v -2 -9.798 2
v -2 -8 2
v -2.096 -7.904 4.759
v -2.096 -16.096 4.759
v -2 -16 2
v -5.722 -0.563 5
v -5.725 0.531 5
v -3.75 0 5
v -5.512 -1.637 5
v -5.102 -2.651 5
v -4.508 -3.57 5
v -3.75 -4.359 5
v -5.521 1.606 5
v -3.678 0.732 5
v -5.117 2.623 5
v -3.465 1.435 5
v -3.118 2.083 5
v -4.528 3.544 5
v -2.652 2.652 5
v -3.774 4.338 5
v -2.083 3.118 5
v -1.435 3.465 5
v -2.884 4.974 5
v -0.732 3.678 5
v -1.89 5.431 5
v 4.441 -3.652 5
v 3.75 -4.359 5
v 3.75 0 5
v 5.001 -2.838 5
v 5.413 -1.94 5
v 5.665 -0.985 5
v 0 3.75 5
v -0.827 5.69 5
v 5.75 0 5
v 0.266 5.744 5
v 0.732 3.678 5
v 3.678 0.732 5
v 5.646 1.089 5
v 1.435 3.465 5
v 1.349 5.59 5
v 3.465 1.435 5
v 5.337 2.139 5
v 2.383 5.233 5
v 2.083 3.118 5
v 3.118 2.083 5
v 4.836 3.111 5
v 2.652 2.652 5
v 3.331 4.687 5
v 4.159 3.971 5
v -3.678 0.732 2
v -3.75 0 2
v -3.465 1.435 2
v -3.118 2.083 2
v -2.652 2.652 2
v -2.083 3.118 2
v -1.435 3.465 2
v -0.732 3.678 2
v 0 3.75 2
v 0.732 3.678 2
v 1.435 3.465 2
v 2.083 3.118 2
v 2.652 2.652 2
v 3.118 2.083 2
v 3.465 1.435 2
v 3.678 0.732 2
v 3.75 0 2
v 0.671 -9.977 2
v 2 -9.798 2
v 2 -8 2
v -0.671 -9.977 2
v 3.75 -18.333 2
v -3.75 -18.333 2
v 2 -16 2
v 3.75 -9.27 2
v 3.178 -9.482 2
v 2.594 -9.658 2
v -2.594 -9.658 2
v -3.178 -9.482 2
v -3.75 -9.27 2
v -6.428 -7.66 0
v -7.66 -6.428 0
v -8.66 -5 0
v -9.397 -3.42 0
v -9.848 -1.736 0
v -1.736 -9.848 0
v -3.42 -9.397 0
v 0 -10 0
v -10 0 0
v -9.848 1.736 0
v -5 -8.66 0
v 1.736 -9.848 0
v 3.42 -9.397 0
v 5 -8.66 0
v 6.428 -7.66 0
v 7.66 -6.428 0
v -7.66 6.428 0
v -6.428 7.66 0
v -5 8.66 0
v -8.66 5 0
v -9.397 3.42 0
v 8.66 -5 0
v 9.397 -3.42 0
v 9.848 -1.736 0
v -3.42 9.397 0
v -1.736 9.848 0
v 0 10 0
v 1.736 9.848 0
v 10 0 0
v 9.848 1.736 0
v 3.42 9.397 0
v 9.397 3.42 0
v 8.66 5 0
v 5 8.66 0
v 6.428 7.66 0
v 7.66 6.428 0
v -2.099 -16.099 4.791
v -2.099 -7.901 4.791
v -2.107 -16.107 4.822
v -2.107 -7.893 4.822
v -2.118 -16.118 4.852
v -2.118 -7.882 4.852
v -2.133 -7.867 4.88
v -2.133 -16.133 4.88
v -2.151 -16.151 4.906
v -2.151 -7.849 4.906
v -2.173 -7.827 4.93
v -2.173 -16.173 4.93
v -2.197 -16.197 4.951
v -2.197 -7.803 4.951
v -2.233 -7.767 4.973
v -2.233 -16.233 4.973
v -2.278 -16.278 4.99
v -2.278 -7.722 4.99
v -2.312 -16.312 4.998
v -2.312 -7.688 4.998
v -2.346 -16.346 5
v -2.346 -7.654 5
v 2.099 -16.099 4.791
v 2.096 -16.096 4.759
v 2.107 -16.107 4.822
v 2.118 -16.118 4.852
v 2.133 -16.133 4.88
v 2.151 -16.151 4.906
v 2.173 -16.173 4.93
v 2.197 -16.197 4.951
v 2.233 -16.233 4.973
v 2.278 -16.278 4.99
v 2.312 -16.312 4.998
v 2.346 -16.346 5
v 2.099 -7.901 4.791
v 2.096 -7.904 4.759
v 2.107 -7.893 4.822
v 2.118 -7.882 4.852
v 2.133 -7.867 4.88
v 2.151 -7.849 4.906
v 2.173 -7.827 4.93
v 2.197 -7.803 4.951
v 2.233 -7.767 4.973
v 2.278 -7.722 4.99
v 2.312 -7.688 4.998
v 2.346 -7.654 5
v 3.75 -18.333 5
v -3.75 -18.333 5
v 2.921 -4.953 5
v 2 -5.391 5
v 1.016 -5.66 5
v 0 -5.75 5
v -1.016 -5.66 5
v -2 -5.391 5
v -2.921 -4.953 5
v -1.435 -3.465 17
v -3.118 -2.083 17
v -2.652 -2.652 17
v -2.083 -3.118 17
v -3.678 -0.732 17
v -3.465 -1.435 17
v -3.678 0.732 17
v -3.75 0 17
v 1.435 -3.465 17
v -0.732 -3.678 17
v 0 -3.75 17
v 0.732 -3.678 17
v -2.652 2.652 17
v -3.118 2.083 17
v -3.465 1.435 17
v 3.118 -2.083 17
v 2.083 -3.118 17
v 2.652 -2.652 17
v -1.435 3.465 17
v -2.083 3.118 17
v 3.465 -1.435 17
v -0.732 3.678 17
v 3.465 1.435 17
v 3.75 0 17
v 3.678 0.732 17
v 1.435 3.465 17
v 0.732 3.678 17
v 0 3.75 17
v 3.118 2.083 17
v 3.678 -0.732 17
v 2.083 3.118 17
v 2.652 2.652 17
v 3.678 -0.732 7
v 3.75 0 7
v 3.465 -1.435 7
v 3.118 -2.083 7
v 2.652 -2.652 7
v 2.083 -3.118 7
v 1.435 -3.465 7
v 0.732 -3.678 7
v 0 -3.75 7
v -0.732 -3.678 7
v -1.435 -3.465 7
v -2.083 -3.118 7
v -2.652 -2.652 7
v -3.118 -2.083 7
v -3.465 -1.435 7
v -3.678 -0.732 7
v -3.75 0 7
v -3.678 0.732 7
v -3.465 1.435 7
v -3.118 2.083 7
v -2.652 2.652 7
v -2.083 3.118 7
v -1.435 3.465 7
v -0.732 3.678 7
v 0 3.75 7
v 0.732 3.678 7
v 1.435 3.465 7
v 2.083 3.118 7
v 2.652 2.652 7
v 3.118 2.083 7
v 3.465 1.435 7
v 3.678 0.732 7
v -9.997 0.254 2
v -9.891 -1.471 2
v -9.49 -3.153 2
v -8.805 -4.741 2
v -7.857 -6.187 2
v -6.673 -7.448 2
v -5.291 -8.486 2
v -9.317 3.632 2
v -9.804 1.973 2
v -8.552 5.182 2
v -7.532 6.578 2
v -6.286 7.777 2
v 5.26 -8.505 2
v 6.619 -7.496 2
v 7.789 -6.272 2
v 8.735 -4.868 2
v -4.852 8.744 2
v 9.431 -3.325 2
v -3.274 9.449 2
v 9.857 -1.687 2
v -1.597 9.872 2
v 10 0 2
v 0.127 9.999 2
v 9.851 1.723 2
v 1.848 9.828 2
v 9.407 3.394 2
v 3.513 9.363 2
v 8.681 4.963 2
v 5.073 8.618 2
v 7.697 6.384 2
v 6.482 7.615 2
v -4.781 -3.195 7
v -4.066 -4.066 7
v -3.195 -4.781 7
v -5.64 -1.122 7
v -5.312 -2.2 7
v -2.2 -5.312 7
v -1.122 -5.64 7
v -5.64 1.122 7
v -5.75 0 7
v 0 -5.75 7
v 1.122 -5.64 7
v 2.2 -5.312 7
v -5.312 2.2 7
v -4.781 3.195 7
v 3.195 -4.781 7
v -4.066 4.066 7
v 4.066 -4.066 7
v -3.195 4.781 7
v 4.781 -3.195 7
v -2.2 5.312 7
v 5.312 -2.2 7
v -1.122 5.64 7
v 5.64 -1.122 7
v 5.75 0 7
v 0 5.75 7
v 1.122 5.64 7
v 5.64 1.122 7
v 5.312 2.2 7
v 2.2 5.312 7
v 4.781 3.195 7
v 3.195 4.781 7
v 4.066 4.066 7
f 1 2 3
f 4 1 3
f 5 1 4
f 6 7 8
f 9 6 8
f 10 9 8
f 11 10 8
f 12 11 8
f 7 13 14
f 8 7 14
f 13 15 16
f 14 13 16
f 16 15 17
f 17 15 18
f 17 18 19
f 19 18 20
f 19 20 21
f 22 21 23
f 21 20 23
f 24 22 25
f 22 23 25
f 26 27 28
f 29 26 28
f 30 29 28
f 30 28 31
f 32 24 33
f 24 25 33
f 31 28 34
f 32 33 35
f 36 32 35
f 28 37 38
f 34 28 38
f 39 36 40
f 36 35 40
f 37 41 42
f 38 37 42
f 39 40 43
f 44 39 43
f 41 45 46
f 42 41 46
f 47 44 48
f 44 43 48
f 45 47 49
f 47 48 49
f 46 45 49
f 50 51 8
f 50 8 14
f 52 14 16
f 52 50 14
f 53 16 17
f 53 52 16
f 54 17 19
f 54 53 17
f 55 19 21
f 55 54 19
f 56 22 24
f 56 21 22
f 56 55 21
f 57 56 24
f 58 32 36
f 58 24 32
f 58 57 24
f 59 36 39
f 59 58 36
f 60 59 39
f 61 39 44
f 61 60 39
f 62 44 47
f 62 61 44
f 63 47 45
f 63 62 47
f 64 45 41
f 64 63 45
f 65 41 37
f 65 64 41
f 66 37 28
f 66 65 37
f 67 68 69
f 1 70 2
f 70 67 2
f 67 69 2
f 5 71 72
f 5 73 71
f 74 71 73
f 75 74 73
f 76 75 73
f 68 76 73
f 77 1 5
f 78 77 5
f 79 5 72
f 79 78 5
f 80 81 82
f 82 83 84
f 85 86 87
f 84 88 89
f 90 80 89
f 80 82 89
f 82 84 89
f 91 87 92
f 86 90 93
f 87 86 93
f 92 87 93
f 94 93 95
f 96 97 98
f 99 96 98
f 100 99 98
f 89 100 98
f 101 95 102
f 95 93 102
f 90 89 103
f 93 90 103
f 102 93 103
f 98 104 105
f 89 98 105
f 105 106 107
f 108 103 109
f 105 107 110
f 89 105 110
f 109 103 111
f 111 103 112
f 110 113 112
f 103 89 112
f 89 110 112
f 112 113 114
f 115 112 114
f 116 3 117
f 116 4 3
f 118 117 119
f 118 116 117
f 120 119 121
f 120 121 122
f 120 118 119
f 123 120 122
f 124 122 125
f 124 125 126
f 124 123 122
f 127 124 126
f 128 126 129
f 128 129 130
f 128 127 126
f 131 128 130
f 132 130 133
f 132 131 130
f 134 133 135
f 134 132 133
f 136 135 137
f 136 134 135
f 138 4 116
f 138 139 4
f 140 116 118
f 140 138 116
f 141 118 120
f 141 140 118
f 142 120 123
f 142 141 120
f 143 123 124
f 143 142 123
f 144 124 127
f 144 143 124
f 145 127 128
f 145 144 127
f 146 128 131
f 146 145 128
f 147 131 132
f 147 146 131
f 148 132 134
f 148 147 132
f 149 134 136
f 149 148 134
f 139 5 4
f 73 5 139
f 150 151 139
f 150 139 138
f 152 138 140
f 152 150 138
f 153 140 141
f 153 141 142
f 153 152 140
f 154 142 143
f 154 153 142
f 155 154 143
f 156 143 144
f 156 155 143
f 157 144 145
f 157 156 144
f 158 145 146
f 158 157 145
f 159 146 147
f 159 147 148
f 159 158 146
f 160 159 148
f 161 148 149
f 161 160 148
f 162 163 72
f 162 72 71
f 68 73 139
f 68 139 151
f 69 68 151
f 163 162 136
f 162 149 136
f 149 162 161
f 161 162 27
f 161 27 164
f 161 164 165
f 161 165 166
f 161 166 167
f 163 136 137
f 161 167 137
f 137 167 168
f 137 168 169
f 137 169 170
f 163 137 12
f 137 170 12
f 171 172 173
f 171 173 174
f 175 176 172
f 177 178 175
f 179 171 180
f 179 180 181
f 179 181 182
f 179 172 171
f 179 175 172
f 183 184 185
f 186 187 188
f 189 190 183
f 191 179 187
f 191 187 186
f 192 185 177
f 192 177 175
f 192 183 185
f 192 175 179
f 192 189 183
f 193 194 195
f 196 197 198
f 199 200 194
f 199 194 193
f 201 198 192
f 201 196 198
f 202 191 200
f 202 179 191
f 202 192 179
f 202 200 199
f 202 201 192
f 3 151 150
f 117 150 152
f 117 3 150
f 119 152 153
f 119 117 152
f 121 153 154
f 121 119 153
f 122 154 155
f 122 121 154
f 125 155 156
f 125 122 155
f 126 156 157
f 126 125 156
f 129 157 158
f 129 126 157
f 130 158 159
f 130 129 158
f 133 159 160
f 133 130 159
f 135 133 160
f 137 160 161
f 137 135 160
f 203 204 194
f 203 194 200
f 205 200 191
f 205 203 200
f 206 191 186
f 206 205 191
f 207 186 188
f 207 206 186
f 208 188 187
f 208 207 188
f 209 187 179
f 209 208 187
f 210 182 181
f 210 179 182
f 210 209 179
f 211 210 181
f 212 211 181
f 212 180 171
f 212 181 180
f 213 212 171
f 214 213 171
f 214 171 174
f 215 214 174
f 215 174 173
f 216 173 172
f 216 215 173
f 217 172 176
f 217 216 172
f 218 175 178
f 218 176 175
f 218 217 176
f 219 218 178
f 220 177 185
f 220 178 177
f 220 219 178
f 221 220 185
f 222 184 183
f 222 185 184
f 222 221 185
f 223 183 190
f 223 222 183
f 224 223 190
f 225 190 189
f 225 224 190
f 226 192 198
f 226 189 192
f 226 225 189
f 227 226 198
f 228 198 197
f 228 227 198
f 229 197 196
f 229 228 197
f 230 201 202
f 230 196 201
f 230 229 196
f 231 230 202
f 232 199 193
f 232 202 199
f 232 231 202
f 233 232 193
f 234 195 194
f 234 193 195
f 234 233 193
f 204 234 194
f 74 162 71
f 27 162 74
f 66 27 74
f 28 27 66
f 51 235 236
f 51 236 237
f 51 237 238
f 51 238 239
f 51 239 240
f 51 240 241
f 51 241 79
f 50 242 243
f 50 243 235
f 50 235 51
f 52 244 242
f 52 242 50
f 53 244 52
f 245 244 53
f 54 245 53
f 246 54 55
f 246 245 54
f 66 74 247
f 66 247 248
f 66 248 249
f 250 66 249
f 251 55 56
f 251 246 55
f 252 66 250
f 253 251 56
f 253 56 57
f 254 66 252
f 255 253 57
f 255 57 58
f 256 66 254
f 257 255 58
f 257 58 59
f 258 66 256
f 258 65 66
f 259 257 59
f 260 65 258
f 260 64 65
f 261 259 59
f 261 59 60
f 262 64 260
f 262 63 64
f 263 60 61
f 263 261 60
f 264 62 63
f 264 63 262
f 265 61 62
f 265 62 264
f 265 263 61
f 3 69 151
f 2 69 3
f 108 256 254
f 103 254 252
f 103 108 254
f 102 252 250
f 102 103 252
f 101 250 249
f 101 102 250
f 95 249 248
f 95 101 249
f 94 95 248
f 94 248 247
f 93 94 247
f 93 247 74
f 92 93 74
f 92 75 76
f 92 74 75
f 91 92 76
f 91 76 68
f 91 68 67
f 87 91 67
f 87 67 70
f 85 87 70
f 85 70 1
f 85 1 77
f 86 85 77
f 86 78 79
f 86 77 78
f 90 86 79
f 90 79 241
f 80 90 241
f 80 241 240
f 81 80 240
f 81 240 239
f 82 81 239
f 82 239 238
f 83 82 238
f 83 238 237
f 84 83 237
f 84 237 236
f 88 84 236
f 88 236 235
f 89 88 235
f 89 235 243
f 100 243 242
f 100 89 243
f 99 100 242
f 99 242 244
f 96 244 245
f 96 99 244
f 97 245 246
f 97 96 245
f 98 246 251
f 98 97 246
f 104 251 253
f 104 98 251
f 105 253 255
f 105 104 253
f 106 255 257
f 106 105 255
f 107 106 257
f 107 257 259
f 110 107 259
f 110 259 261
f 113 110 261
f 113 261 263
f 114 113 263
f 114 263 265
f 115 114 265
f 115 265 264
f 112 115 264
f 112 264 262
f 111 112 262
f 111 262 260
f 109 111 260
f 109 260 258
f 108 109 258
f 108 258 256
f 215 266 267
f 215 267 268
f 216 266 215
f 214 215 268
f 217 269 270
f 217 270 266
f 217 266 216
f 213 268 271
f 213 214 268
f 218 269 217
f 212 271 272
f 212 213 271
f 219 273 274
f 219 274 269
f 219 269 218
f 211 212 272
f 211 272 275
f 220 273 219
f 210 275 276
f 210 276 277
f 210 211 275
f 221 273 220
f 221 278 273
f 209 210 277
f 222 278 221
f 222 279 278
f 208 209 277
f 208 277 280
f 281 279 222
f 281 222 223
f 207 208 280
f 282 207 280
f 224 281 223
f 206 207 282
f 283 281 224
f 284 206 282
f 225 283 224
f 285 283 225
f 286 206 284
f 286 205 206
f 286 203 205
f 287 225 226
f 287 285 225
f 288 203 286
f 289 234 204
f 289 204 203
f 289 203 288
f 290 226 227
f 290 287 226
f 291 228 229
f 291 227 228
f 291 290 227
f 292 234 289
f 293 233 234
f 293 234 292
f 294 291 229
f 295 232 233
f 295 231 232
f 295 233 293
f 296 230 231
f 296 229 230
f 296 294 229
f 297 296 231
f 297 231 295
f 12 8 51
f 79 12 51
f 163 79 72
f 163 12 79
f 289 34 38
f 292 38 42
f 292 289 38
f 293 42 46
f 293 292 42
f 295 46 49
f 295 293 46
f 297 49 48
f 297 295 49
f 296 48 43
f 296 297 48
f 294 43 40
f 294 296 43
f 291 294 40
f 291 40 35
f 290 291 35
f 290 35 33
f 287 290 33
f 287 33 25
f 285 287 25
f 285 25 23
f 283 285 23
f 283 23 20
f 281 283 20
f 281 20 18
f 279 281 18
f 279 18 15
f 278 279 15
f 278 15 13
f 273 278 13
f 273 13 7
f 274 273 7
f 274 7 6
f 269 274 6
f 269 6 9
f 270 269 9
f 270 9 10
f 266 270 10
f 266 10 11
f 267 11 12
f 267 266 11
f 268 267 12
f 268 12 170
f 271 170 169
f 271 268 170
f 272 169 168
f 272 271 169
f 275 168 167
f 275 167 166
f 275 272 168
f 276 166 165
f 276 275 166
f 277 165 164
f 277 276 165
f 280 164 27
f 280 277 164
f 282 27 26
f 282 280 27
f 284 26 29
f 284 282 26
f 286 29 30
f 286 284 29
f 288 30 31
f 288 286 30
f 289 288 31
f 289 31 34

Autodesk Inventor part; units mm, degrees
ref_plane "YZ Plane" through (0, 0, 0) normal (1, 0, 0) x (0, 1, 0)
ref_plane "XZ Plane" through (0, 0, 0) normal (0, 1, 0) x (-1, 0, 0)
sketch "Sketch1" plane through (0, 0, 0) normal (0, 0, 1) x (1, 0, 0)
  circle A0 centre (0, 0) radius 10
  dimension "d0" = 20
extrude "Extrusion1" add sketch "Sketch1" along normal blind 2
sketch "Sketch2" plane through (0, 0, 2) normal (0, 0, 1) x (1, 0, 0)
  circle A0 centre (0, 0) radius 3.75
  dimension "d3" = 7.5
extrude "Extrusion2" add sketch "Sketch2" along normal blind 15
ref_plane "Work Plane2" through (0, 0, 7) normal (0, 0, 1) x (1, 0, 0)
sketch "Sketch7" plane through (0, 0, 7) normal (0, 0, 1) x (1, 0, 0)
  circle A0 centre (0, 0) radius 3.75 projected
  circle A1 centre (0, 0) radius 5.75
  dimension "d27" = 2
extrude "Extrusion7" add sketch "Sketch7" against normal blind 2
sketch "Sketch8" plane through (0, 0, 5) normal (0, 0, -1) x (-1, 0, 0)
  circle A0 centre (0, 0) radius 5.75 projected
  circle A1 centre (0, 0) radius 3.75 projected
  circle A2 centre (0, 0) radius 5.75 construction
  line L0 (5.75, 0) -> (-5.75, 0) construction
  line L1 (-3.75, 0) -> (3.75, 0)
  line L2 (3.75, 0) -> (3.75, -18.3333)
  line L3 (3.75, -18.3333) -> (-3.75, -18.3333)
  line L4 (-3.75, -18.3333) -> (-3.75, 0)
  dimension "d31" = 18.3333
extrude "Extrusion8" add sketch "Sketch8" along normal blind 3 contours L4 A1 L2 A0 | A0 L2 L3 L4 picked at (2.8343, -4.1874)
sketch "Sketch9" plane through (0, 0, 2) normal (0, 0, -1) x (-1, 0, 0)
  arc A0 (-3.75, -4.3589) -> (3.75, -4.3589) centre (0, 0) ccw projected
  line L0 (3.75, -18.3333) -> (3.75, -4.3589) projected
  line L1 (-3.75, -18.3333) -> (3.75, -18.3333) projected
  line L2 (-3.75, -4.3589) -> (-3.75, -18.3333) projected
  line L3 (-2, -8) -> (2, -8)
  line L4 (2, -8) -> (2, -16)
  line L5 (2, -16) -> (-2, -16)
  line L6 (-2, -16) -> (-2, -8)
  dimension "d34" = 2
  dimension "d35" = 4
  dimension "d36" = 8
  dimension "d37" = 8
extrude "Extrusion9" cut sketch "Sketch9" against normal up to surface (3 mm away) draft 2 contours L3 L4 L5 L6
fillet "Fillet2" radius 0.25 4 edges at (0, -16.1048, 5) (2.1048, -12, 5) (-2.1048, -12, 5) (0, -7.8952, 5)
equation "\"d1\" = IG_gearThickness"
equation "\"d3\" = IG_shaftDiameter"
equation "\"d4\" = IG_shaftLength"
equation "\"Wheel_Related_W_\" = 0"
equation "\"W_innerDepth\" = 4"
equation "\"W_wallThickness\" = 2"
equation "\"W_holesClearance\" = 0.3"
equation "\"W_outerGearHoleDiameter\" = 5.3"
equation "\"W_innerGearHoleDiameter\" = 10.1"
equation "\"TempSpotReserved7\" = 0"
equation "\"TempSpotReserved8\" = 0"
equation "\"TempSpotReserved9\" = 0"
equation "\"TempSpotReserved10\" = 0"
equation "\"TempSpotReserved11\" = 0"
equation "\"TempSpotReserved12\" = 0"
equation "\"TempSpotReserved13\" = 0"
equation "\"TempSpotReserved14\" = 0"
equation "\"TempSpotReserved15\" = 0"
equation "\"TempSpotReserved16\" = 0"
equation "\"TempSpotReserved17\" = 0"
equation "\"TempSpotReserved18\" = 0"
equation "\"TempSpotReserved19\" = 0"
equation "\"TempSpotReserved20\" = 0"
equation "\"Inner_Gear_Related_IG_\" = 0"
equation "\"IG_shaftDiameter\" = 7.5"
equation "\"IG_shaftLength\" = 15"
equation "\"IG_gearThickness\" = 2"
equation "\"TempSpotReserved25\" = 0"
equation "\"TempSpotReserved26\" = 0"
equation "\"TempSpotReserved27\" = 0"
equation "\"TempSpotReserved28\" = 0"
equation "\"TempSpotReserved29\" = 0"
equation "\"TempSpotReserved30\" = 0"
equation "\"TempSpotReserved31\" = 0"
equation "\"TempSpotReserved32\" = 0"
equation "\"TempSpotReserved33\" = 0"
equation "\"TempSpotReserved34\" = 0"
equation "\"TempSpotReserved35\" = 0"
equation "\"TempSpotReserved36\" = 0"
equation "\"TempSpotReserved37\" = 0"
equation "\"TempSpotReserved38\" = 0"
equation "\"TempSpotReserved39\" = 0"
equation "\"TempSpotReserved40\" = 0"
equation "\"Outer_Gear_Related_OG_\" = 0"
equation "\"OG_distanceFromCenter\" = 23.33333"
equation "\"OG_shaftDiameter\" = 5"
equation "\"OG_gearDiameter\" = 26.66667"
equation "\"OG_shaftLength\" = 7"
equation "\"OG_gearThickness\" = 2"
equation "\"TempSpotReserved47\" = 0"
equation "\"TempSpotReserved48\" = 0"
equation "\"TempSpotReserved49\" = 0"
equation "\"TempSpotReserved50\" = 0"
equation "\"TempSpotReserved51\" = 0"
equation "\"TempSpotReserved52\" = 0"
equation "\"TempSpotReserved53\" = 0"
equation "\"TempSpotReserved54\" = 0"
equation "\"TempSpotReserved55\" = 0"
equation "\"TempSpotReserved56\" = 0"
equation "\"TempSpotReserved57\" = 0"
equation "\"TempSpotReserved58\" = 0"
equation "\"TempSpotReserved59\" = 0"
equation "\"TempSpotReserved60\" = 0"
equation "\"Leg_Extensions_Related_LE_\" = 0"
equation "\"LE_baseDiameter\" = 5"
equation "\"LE_maxLength\" = 24.6522"
equation "\"LE_thickness\" = 2.5"
equation "\"IG_ratioToOuterGear\" = 0.75"
equation "\"B_bearingThickness\" = 1"
equation "\"TempSpotReserved43\" = 0"
equation "\"TempSpotReserved45\" = 0"
equation "\"Thisisatest\" = 25.4"
equation "\"TempSpotReserved46\" = 0"
equation "\"TempSpotReserved44\" = 0"
equation "\"LE_offsetAboveOuterGear\" = 0"
equation "\"Bearing_Related_B_\" = 0"
equation "\"TempSpotReserved42\" = 0"
equation "\"OG_skirtOffset\" = 1"
equation "\"OG_skirtThickness\" = 1"
equation "\"IG_skirtThickness\" = 2"
equation "\"IG_extentionLength\" = 18.33333"
equation "\"IG_extentionThickness\" = 3"
equation "\"IG_slitWidth\" = 4"
equation "\"IG_slitlength\" = 8"
equation "\"IG_slitDistanceFromCenterHole\" = 8"
equation "\"IG_slitClearance\" = 0.2"
equation "\"Reserved_10\" = 0"
equation "\"Reserved_9\" = 0"
equation "\"Reserved_11\" = 0"
equation "\"Reserved_12\" = 0"
equation "\"Reserved_8\" = 0"
equation "\"Reserved_7\" = 0"
equation "\"Reserved_26\" = 0"
equation "\"Reserved_20\" = 0"
equation "\"Reserved_22\" = 0"
equation "\"Reserved_23\" = 0"
equation "\"Reserved_25\" = 0"
equation "\"Reserved_24\" = 0"
equation "\"Reserved_21\" = 0"
equation "\"Reserved_19\" = 0"
equation "\"Reserved_27\" = 0"
equation "\"Reserved_14\" = 0"
equation "\"Reserved_15\" = 0"
equation "\"Reserved_16\" = 0"
equation "\"Reserved_13\" = 0"
equation "\"Reserved_17\" = 0"
equation "\"Reserved_18\" = 0"
equation "\"Bearing_Related_BR_\" = 0"
equation "\"BR_bearingThickness\" = 1"
equation "\"Block_Related_BL_\" = 0"
equation "\"BL_width\" = 3.8"
equation "\"BL_length\" = 7.8"
equation "\"W_filletRadius\" = 0.25"
equation "\"W_extrutsionTaperAngle\" = 2deg"
equation "\"OG_protrudeDistance\" = 3"
properties part number "innerGear"
